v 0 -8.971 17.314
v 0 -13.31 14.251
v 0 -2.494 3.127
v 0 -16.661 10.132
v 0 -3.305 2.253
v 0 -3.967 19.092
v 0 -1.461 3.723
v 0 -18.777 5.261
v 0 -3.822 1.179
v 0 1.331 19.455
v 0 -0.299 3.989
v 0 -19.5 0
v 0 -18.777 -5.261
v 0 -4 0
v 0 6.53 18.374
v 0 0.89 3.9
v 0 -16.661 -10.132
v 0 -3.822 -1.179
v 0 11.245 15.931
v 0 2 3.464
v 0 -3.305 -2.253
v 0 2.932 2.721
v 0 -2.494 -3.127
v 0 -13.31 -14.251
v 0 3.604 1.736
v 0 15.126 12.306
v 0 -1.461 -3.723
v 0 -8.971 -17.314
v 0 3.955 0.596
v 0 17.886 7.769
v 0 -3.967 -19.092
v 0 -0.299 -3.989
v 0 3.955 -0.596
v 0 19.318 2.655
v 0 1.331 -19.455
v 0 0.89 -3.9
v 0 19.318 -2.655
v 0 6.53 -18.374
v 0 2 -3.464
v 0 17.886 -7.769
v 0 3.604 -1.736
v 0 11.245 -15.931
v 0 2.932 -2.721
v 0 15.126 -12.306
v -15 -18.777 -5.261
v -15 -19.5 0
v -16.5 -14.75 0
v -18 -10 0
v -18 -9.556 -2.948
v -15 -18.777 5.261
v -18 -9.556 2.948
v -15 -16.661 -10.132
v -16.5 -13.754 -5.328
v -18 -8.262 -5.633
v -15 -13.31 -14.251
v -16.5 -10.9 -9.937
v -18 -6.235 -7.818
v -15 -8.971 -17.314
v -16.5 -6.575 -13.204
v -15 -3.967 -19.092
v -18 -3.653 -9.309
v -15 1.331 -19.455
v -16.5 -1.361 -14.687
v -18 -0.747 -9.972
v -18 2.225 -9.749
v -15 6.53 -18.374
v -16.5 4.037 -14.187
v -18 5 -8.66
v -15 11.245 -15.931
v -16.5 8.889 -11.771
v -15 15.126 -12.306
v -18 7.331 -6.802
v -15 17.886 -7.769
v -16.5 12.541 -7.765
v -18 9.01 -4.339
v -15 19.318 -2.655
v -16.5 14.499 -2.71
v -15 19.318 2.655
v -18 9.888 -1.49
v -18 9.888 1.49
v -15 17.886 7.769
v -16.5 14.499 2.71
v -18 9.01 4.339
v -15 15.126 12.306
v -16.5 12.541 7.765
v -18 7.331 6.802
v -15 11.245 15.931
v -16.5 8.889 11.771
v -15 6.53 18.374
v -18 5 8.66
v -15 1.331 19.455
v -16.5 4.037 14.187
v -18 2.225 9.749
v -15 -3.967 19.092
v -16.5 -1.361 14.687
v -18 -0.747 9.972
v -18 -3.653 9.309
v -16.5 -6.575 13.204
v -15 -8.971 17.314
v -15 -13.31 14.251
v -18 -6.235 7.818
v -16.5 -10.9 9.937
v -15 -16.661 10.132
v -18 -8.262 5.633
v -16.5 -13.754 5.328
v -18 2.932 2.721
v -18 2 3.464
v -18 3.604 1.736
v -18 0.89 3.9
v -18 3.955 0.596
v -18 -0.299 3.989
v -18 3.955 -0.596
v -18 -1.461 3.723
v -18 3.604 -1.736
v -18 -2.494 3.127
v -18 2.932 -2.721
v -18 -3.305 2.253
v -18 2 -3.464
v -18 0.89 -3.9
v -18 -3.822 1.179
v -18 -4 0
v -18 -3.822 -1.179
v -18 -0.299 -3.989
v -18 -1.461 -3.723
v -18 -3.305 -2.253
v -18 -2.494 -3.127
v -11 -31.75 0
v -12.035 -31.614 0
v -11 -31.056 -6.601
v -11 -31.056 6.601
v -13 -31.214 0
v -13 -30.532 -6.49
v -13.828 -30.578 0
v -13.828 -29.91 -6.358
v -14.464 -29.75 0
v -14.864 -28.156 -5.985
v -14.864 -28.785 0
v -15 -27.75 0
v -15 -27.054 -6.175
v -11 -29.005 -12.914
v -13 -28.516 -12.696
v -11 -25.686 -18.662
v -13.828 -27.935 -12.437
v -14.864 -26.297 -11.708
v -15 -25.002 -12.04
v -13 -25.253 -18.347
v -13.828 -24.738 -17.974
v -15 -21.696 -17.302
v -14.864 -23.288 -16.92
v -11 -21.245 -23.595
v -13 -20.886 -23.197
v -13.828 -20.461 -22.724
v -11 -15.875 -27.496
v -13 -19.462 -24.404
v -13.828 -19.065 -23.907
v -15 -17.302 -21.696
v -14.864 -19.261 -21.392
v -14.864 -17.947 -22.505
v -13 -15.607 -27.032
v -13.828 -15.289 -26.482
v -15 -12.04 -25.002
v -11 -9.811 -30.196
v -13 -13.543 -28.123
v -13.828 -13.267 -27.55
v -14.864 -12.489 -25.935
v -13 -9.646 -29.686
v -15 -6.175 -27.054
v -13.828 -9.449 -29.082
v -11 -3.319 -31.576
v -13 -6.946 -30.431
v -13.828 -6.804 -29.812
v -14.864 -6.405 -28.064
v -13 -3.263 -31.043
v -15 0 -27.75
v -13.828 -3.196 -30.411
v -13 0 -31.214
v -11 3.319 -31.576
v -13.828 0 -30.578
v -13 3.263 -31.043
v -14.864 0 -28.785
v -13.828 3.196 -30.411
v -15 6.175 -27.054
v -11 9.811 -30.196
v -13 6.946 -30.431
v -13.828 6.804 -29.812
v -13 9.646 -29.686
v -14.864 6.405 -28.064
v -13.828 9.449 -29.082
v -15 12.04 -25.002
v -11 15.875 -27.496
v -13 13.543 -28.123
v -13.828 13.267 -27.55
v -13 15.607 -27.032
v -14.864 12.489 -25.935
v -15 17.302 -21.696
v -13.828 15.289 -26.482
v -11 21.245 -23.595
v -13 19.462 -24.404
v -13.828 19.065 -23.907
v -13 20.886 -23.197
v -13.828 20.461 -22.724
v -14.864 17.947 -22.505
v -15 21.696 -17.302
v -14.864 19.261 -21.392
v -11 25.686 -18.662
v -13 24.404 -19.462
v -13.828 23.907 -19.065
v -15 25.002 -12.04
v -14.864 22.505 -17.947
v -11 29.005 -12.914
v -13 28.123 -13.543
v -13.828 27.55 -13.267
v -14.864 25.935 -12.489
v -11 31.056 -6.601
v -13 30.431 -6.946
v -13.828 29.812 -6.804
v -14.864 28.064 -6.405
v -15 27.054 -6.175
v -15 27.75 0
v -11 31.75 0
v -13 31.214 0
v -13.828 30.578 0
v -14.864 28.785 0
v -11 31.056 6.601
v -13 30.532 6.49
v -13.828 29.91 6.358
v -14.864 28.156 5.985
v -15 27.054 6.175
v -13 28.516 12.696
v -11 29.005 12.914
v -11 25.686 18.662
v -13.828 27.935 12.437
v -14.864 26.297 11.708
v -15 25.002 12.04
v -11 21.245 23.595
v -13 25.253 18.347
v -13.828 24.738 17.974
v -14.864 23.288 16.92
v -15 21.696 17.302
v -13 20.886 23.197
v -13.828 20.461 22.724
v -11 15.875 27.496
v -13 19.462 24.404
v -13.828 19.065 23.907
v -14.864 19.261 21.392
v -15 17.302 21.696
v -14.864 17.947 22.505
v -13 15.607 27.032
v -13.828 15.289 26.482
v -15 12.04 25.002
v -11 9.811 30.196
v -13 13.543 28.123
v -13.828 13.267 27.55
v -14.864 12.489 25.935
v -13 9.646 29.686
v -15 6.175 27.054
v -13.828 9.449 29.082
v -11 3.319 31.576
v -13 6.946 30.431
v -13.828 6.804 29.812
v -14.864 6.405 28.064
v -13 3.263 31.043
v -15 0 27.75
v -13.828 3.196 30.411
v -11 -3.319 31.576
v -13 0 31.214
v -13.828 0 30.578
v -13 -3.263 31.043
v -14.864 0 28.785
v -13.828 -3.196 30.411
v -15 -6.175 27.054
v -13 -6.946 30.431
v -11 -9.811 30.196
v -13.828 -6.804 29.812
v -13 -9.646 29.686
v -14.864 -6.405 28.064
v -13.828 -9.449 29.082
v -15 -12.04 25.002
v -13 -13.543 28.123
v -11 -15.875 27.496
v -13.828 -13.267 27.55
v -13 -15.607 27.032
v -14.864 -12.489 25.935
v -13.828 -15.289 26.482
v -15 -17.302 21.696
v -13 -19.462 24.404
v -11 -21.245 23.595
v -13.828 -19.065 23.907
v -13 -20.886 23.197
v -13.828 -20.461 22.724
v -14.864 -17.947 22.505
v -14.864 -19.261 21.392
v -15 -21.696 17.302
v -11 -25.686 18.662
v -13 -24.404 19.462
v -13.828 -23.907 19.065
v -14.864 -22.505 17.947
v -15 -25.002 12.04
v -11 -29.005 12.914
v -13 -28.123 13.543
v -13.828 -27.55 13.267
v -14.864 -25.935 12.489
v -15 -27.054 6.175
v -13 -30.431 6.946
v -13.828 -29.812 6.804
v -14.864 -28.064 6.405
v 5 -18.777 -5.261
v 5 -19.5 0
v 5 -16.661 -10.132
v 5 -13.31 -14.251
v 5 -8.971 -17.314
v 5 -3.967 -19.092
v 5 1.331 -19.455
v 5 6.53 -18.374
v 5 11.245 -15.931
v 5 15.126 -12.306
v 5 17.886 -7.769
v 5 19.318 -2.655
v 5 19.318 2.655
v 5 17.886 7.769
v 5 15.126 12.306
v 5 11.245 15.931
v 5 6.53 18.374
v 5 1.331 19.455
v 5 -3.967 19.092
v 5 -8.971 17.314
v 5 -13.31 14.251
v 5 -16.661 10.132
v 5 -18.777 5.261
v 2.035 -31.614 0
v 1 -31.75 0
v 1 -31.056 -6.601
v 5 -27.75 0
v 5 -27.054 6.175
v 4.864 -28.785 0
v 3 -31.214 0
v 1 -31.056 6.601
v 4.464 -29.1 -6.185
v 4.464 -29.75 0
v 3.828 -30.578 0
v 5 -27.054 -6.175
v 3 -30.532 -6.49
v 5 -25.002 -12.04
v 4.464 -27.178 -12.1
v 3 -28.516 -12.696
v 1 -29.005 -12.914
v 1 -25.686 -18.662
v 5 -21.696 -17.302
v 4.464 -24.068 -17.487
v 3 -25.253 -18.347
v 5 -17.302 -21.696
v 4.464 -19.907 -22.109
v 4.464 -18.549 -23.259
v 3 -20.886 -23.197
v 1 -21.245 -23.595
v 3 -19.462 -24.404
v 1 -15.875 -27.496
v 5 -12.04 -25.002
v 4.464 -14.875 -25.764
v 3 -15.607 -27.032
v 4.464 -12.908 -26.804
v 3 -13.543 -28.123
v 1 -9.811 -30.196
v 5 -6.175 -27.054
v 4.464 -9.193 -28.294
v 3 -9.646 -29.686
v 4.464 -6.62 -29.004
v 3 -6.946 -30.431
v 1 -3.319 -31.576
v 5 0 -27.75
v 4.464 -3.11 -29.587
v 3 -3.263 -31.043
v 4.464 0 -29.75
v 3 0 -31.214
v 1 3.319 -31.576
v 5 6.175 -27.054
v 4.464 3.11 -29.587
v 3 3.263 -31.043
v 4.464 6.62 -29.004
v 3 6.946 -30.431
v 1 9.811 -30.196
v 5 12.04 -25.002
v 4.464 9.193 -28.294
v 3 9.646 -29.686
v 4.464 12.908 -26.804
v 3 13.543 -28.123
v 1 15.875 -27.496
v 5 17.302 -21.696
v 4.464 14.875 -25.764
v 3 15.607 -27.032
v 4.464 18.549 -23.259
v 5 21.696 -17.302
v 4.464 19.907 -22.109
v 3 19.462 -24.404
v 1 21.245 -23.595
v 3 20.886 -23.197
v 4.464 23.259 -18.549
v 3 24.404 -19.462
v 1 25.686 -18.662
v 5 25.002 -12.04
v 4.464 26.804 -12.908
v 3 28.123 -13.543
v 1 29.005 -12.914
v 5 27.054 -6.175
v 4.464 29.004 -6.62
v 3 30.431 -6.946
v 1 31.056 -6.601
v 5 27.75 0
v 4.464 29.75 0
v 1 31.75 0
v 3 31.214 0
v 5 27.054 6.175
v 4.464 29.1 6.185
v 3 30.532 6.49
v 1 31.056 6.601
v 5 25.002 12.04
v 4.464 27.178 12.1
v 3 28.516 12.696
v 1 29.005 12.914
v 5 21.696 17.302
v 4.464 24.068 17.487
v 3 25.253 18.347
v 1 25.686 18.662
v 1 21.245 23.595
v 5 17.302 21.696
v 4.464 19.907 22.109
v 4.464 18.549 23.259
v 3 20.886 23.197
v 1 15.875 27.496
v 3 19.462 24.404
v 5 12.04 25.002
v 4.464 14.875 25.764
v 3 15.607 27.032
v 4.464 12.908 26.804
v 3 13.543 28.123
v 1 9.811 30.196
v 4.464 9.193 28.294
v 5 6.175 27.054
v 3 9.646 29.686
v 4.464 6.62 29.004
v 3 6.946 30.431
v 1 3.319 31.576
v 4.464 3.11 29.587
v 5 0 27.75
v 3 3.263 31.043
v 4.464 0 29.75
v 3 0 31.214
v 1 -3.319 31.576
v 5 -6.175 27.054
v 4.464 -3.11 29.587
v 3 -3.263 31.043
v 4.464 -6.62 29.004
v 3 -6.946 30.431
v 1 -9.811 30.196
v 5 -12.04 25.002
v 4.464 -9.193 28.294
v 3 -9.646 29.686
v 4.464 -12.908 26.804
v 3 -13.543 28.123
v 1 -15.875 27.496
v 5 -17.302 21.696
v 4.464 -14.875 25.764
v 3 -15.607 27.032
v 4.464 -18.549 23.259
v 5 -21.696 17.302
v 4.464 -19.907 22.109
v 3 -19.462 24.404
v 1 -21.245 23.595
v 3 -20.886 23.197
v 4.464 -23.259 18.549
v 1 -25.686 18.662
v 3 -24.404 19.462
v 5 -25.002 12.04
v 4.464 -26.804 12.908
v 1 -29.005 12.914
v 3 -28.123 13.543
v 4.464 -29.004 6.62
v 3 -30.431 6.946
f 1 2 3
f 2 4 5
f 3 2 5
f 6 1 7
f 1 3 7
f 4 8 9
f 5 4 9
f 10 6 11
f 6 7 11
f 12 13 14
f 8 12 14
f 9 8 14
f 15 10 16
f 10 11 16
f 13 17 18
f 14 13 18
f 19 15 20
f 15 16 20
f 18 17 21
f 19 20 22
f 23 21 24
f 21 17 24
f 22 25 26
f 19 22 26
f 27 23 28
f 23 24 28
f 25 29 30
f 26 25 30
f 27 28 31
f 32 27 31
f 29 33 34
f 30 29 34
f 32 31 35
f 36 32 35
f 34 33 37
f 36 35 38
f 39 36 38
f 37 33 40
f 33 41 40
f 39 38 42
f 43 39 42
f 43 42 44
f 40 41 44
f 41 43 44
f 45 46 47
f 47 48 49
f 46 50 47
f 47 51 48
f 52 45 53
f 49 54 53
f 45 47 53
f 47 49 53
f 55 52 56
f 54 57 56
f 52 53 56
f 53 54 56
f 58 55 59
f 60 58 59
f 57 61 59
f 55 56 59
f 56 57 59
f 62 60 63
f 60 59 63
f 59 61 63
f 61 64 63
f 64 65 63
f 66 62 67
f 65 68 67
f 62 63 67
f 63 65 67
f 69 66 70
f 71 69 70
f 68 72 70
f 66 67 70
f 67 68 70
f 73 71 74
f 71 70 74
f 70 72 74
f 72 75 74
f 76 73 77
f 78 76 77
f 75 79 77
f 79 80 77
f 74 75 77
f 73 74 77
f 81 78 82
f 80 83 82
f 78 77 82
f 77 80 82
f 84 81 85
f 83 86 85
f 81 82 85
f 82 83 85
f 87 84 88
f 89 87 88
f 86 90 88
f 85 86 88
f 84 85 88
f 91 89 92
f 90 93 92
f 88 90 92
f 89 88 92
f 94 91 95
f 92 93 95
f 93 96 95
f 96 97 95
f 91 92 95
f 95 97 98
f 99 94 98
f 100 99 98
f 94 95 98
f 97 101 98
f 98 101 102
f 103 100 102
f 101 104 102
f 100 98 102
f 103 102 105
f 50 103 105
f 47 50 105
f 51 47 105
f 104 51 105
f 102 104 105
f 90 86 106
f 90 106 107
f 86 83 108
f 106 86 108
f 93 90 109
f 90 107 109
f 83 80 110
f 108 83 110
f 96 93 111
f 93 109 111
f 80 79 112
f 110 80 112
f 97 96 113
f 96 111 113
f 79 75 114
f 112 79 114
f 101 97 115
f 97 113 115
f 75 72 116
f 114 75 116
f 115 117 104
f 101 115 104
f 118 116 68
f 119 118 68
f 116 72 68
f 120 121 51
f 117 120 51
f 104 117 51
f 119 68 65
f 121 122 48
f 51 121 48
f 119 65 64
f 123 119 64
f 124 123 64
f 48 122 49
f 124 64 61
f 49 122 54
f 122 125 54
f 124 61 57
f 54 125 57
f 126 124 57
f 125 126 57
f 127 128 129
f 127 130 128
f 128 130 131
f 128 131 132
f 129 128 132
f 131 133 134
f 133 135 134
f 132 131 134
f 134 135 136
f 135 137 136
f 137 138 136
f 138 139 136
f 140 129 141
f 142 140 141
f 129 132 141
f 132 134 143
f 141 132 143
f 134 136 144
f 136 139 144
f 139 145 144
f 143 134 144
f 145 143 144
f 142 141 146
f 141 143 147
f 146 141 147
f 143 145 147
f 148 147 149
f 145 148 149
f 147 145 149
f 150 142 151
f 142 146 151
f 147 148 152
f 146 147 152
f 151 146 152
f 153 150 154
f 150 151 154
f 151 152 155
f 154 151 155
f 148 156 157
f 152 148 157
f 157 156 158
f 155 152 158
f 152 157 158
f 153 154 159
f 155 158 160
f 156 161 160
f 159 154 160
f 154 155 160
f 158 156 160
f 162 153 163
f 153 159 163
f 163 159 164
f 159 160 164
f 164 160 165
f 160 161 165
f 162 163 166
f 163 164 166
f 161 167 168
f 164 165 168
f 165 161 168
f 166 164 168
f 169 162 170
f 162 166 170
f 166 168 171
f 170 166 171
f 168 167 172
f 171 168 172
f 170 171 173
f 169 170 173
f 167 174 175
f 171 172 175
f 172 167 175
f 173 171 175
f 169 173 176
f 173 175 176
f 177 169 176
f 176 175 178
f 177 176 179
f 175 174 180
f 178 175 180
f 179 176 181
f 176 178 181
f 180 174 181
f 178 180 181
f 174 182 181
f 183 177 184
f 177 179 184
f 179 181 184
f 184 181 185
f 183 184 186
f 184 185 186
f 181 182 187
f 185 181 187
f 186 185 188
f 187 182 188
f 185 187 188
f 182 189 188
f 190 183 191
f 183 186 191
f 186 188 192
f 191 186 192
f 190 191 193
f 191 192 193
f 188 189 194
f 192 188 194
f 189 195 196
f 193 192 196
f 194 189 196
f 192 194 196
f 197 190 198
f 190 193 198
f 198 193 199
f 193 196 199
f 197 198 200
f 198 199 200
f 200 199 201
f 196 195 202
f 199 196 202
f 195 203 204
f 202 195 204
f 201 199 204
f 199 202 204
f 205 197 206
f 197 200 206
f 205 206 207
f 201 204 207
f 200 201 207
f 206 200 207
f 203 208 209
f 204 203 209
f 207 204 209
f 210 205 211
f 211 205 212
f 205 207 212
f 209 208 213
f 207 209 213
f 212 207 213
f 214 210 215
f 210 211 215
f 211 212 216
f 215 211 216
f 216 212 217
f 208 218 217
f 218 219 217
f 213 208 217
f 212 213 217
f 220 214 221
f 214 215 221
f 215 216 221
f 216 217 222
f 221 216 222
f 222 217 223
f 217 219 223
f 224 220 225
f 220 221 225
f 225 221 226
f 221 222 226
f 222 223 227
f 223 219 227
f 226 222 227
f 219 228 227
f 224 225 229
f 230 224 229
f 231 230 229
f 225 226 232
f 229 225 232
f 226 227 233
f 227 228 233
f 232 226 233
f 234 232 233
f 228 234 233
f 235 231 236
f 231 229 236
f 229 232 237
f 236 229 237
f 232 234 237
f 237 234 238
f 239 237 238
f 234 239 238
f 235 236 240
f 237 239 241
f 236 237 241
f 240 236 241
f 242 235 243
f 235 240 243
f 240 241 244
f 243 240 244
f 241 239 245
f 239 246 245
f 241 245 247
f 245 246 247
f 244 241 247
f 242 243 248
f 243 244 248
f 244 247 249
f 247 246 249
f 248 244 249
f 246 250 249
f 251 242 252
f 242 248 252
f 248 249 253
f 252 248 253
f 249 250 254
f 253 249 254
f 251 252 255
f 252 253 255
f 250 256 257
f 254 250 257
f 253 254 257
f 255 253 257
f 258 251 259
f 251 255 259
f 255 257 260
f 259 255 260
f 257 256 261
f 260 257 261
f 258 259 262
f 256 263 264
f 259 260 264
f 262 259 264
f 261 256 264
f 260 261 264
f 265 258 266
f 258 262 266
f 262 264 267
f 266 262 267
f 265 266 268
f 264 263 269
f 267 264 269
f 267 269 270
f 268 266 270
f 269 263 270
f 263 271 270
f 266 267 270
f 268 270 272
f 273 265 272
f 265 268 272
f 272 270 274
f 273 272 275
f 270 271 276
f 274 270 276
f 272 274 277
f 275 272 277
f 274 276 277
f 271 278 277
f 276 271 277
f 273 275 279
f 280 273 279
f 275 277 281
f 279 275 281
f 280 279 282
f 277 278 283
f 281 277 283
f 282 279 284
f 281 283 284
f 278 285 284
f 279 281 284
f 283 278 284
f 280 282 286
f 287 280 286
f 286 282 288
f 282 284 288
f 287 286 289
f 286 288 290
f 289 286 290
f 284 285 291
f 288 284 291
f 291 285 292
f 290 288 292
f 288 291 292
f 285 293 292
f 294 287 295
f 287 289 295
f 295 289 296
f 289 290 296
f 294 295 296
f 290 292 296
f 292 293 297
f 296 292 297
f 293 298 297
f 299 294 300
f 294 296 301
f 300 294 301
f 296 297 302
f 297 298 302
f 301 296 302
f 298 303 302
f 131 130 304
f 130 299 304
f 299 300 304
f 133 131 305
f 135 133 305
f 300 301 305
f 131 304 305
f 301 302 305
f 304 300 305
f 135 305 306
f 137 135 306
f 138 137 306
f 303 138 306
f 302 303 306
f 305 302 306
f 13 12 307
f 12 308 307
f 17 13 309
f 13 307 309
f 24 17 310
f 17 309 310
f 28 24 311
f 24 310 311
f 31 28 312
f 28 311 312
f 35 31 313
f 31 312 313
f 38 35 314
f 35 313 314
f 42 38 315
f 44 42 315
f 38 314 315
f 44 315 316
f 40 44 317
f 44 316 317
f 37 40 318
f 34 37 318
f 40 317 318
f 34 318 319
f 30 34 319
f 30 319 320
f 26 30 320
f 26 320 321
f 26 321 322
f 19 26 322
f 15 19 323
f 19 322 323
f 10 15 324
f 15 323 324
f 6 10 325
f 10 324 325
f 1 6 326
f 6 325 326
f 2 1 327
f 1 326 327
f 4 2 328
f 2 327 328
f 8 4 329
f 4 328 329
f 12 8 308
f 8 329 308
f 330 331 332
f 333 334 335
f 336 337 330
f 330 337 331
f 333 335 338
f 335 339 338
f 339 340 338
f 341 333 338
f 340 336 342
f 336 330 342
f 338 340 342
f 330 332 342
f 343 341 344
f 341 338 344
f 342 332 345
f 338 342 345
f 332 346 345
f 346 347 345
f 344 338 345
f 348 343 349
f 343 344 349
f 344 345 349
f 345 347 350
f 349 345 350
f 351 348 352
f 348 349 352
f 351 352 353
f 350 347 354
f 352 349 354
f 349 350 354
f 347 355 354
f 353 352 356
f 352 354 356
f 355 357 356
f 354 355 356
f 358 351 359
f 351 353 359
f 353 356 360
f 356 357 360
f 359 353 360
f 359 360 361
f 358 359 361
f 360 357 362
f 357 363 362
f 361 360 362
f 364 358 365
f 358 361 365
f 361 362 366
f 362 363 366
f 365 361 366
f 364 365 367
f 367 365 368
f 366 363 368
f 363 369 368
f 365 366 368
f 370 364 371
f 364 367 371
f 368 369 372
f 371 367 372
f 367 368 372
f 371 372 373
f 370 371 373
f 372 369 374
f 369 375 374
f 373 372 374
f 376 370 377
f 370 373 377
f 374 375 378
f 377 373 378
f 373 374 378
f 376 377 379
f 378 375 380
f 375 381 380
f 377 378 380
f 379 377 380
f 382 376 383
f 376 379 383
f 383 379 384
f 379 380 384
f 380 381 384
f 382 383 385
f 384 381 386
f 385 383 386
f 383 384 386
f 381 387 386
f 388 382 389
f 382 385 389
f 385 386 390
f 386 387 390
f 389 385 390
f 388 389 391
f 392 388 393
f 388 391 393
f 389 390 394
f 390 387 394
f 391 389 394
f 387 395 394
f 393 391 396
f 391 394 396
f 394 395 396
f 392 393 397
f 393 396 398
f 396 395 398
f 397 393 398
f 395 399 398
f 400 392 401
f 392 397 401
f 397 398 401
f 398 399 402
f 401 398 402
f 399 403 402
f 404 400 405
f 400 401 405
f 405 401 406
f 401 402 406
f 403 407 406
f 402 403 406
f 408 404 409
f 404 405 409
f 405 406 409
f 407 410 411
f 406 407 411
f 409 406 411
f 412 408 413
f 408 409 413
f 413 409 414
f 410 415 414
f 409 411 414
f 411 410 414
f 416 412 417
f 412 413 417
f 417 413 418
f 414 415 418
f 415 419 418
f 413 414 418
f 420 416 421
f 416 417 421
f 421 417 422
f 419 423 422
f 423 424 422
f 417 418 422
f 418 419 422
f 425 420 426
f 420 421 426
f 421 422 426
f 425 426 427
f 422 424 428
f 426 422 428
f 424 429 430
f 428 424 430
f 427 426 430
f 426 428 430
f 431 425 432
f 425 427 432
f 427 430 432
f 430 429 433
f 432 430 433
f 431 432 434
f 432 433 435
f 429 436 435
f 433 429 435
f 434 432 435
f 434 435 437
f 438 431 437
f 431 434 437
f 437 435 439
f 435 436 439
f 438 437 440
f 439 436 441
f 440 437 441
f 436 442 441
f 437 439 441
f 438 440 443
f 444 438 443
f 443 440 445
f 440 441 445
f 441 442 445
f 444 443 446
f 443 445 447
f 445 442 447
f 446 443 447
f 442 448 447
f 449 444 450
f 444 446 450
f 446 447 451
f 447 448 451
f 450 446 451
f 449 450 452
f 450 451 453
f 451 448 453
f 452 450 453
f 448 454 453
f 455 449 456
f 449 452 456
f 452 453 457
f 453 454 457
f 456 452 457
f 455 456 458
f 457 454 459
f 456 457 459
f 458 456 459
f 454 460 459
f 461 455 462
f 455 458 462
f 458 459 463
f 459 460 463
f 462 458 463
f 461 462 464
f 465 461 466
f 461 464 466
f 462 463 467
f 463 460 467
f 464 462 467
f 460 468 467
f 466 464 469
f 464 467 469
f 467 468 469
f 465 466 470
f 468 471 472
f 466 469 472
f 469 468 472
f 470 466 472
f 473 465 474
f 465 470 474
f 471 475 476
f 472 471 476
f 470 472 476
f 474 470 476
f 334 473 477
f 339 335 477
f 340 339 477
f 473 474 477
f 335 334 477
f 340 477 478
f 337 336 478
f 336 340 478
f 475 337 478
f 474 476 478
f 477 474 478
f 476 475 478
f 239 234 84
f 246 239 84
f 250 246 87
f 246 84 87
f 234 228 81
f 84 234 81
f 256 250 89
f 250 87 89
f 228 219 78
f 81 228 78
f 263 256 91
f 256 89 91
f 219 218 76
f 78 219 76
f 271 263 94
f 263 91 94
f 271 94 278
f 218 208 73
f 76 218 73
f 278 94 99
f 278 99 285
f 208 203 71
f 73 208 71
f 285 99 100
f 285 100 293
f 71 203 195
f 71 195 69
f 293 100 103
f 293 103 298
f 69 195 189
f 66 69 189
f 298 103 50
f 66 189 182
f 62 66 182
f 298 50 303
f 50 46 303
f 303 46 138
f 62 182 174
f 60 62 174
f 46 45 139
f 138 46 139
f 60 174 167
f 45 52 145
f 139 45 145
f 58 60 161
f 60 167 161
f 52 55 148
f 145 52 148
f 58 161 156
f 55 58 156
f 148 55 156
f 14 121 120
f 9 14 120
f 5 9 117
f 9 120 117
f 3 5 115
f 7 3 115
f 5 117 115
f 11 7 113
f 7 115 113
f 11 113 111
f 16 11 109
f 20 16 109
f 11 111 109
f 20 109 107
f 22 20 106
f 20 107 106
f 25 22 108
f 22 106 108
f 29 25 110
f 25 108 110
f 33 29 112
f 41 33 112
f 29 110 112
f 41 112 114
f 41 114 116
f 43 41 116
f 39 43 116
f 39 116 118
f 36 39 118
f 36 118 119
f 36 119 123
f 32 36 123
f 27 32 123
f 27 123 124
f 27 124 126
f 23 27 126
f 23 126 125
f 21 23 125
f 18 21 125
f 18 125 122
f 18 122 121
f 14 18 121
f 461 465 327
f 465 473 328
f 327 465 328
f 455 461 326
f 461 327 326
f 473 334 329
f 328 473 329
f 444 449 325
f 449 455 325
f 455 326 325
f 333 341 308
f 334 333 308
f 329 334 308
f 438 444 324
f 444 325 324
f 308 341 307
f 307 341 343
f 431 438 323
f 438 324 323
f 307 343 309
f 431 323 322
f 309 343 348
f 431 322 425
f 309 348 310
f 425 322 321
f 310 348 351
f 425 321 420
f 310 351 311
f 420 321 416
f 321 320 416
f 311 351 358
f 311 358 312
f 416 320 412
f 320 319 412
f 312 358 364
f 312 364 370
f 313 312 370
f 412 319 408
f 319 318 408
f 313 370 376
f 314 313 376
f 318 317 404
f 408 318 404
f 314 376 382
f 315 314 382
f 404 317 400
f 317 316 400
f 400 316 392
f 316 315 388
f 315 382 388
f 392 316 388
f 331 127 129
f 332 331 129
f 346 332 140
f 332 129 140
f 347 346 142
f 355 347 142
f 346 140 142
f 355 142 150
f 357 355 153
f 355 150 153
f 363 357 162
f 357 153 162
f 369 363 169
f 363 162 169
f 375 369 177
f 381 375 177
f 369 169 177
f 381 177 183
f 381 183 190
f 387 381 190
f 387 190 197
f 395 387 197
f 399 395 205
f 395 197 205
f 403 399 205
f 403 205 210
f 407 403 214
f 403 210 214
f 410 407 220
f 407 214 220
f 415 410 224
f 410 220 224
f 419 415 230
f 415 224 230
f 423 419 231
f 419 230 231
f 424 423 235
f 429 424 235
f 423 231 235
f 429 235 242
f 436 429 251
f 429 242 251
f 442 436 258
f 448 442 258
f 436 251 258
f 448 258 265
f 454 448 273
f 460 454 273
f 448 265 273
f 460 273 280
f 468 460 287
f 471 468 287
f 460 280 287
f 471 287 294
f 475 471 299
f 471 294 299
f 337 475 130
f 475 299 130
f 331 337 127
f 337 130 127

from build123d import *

# Parameters (mm, degrees)
CROQUIS2_R            = 4
CORTAR_EXTRUIR1_DEPTH = 51.449231907
REDONDEO1_R           = 4


with BuildPart() as part:
    # Croquis1 → Revolución1 (revolve)
    with BuildSketch(Plane.XY, mode=Mode.PRIVATE) as revoluci_n1_sk:
        Polygon((0, 0), (0, 19.5), (5, 19.5), (5, 31.75), (-15, 31.75), (-15, 19.5), (-18, 10), (-18, 0), align=None)
    revolve(revoluci_n1_sk.sketch.rotate(Axis((-18, 0, 0), (1, 0, 0)), 180), axis=Axis((-18, 0, 0), (1, 0, 0)))

    # Croquis2 → Cortar-Extruir1 (cut, through all)
    with BuildSketch(Plane.ZY.offset(18)):
        with Locations(Location((0, 0, 0), (0, 0, 270))):
            Circle(CROQUIS2_R)
    extrude(amount=-CORTAR_EXTRUIR1_DEPTH, mode=Mode.SUBTRACT)

    # Redondeo1
    redondeo1_edges = [part.edges().sort_by_distance(p)[0] for p in [
        (-15, 31.75, 0),
        (5, 31.75, 0),
    ]]
    fillet(redondeo1_edges, radius=REDONDEO1_R)


solid = part.part
